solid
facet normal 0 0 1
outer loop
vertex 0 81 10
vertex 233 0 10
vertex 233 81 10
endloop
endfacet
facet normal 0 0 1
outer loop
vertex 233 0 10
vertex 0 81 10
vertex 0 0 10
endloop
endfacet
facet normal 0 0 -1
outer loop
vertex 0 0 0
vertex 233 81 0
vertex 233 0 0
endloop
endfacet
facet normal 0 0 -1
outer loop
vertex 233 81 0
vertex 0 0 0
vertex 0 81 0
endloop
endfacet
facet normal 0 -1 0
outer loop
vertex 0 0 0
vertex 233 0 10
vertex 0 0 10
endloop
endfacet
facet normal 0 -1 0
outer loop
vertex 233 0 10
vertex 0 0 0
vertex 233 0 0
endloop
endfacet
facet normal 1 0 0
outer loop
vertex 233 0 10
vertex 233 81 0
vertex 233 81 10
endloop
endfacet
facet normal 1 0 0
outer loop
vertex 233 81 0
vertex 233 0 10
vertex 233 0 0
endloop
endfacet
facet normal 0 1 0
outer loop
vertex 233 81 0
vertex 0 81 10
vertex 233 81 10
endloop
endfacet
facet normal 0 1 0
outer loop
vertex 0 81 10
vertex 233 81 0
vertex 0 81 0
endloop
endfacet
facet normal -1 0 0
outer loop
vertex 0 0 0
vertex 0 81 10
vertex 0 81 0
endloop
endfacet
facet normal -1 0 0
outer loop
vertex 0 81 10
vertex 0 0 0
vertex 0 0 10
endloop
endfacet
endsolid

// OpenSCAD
length = 233;
width = 81;

color("red"){
	cube([length, width, 10]);
}
